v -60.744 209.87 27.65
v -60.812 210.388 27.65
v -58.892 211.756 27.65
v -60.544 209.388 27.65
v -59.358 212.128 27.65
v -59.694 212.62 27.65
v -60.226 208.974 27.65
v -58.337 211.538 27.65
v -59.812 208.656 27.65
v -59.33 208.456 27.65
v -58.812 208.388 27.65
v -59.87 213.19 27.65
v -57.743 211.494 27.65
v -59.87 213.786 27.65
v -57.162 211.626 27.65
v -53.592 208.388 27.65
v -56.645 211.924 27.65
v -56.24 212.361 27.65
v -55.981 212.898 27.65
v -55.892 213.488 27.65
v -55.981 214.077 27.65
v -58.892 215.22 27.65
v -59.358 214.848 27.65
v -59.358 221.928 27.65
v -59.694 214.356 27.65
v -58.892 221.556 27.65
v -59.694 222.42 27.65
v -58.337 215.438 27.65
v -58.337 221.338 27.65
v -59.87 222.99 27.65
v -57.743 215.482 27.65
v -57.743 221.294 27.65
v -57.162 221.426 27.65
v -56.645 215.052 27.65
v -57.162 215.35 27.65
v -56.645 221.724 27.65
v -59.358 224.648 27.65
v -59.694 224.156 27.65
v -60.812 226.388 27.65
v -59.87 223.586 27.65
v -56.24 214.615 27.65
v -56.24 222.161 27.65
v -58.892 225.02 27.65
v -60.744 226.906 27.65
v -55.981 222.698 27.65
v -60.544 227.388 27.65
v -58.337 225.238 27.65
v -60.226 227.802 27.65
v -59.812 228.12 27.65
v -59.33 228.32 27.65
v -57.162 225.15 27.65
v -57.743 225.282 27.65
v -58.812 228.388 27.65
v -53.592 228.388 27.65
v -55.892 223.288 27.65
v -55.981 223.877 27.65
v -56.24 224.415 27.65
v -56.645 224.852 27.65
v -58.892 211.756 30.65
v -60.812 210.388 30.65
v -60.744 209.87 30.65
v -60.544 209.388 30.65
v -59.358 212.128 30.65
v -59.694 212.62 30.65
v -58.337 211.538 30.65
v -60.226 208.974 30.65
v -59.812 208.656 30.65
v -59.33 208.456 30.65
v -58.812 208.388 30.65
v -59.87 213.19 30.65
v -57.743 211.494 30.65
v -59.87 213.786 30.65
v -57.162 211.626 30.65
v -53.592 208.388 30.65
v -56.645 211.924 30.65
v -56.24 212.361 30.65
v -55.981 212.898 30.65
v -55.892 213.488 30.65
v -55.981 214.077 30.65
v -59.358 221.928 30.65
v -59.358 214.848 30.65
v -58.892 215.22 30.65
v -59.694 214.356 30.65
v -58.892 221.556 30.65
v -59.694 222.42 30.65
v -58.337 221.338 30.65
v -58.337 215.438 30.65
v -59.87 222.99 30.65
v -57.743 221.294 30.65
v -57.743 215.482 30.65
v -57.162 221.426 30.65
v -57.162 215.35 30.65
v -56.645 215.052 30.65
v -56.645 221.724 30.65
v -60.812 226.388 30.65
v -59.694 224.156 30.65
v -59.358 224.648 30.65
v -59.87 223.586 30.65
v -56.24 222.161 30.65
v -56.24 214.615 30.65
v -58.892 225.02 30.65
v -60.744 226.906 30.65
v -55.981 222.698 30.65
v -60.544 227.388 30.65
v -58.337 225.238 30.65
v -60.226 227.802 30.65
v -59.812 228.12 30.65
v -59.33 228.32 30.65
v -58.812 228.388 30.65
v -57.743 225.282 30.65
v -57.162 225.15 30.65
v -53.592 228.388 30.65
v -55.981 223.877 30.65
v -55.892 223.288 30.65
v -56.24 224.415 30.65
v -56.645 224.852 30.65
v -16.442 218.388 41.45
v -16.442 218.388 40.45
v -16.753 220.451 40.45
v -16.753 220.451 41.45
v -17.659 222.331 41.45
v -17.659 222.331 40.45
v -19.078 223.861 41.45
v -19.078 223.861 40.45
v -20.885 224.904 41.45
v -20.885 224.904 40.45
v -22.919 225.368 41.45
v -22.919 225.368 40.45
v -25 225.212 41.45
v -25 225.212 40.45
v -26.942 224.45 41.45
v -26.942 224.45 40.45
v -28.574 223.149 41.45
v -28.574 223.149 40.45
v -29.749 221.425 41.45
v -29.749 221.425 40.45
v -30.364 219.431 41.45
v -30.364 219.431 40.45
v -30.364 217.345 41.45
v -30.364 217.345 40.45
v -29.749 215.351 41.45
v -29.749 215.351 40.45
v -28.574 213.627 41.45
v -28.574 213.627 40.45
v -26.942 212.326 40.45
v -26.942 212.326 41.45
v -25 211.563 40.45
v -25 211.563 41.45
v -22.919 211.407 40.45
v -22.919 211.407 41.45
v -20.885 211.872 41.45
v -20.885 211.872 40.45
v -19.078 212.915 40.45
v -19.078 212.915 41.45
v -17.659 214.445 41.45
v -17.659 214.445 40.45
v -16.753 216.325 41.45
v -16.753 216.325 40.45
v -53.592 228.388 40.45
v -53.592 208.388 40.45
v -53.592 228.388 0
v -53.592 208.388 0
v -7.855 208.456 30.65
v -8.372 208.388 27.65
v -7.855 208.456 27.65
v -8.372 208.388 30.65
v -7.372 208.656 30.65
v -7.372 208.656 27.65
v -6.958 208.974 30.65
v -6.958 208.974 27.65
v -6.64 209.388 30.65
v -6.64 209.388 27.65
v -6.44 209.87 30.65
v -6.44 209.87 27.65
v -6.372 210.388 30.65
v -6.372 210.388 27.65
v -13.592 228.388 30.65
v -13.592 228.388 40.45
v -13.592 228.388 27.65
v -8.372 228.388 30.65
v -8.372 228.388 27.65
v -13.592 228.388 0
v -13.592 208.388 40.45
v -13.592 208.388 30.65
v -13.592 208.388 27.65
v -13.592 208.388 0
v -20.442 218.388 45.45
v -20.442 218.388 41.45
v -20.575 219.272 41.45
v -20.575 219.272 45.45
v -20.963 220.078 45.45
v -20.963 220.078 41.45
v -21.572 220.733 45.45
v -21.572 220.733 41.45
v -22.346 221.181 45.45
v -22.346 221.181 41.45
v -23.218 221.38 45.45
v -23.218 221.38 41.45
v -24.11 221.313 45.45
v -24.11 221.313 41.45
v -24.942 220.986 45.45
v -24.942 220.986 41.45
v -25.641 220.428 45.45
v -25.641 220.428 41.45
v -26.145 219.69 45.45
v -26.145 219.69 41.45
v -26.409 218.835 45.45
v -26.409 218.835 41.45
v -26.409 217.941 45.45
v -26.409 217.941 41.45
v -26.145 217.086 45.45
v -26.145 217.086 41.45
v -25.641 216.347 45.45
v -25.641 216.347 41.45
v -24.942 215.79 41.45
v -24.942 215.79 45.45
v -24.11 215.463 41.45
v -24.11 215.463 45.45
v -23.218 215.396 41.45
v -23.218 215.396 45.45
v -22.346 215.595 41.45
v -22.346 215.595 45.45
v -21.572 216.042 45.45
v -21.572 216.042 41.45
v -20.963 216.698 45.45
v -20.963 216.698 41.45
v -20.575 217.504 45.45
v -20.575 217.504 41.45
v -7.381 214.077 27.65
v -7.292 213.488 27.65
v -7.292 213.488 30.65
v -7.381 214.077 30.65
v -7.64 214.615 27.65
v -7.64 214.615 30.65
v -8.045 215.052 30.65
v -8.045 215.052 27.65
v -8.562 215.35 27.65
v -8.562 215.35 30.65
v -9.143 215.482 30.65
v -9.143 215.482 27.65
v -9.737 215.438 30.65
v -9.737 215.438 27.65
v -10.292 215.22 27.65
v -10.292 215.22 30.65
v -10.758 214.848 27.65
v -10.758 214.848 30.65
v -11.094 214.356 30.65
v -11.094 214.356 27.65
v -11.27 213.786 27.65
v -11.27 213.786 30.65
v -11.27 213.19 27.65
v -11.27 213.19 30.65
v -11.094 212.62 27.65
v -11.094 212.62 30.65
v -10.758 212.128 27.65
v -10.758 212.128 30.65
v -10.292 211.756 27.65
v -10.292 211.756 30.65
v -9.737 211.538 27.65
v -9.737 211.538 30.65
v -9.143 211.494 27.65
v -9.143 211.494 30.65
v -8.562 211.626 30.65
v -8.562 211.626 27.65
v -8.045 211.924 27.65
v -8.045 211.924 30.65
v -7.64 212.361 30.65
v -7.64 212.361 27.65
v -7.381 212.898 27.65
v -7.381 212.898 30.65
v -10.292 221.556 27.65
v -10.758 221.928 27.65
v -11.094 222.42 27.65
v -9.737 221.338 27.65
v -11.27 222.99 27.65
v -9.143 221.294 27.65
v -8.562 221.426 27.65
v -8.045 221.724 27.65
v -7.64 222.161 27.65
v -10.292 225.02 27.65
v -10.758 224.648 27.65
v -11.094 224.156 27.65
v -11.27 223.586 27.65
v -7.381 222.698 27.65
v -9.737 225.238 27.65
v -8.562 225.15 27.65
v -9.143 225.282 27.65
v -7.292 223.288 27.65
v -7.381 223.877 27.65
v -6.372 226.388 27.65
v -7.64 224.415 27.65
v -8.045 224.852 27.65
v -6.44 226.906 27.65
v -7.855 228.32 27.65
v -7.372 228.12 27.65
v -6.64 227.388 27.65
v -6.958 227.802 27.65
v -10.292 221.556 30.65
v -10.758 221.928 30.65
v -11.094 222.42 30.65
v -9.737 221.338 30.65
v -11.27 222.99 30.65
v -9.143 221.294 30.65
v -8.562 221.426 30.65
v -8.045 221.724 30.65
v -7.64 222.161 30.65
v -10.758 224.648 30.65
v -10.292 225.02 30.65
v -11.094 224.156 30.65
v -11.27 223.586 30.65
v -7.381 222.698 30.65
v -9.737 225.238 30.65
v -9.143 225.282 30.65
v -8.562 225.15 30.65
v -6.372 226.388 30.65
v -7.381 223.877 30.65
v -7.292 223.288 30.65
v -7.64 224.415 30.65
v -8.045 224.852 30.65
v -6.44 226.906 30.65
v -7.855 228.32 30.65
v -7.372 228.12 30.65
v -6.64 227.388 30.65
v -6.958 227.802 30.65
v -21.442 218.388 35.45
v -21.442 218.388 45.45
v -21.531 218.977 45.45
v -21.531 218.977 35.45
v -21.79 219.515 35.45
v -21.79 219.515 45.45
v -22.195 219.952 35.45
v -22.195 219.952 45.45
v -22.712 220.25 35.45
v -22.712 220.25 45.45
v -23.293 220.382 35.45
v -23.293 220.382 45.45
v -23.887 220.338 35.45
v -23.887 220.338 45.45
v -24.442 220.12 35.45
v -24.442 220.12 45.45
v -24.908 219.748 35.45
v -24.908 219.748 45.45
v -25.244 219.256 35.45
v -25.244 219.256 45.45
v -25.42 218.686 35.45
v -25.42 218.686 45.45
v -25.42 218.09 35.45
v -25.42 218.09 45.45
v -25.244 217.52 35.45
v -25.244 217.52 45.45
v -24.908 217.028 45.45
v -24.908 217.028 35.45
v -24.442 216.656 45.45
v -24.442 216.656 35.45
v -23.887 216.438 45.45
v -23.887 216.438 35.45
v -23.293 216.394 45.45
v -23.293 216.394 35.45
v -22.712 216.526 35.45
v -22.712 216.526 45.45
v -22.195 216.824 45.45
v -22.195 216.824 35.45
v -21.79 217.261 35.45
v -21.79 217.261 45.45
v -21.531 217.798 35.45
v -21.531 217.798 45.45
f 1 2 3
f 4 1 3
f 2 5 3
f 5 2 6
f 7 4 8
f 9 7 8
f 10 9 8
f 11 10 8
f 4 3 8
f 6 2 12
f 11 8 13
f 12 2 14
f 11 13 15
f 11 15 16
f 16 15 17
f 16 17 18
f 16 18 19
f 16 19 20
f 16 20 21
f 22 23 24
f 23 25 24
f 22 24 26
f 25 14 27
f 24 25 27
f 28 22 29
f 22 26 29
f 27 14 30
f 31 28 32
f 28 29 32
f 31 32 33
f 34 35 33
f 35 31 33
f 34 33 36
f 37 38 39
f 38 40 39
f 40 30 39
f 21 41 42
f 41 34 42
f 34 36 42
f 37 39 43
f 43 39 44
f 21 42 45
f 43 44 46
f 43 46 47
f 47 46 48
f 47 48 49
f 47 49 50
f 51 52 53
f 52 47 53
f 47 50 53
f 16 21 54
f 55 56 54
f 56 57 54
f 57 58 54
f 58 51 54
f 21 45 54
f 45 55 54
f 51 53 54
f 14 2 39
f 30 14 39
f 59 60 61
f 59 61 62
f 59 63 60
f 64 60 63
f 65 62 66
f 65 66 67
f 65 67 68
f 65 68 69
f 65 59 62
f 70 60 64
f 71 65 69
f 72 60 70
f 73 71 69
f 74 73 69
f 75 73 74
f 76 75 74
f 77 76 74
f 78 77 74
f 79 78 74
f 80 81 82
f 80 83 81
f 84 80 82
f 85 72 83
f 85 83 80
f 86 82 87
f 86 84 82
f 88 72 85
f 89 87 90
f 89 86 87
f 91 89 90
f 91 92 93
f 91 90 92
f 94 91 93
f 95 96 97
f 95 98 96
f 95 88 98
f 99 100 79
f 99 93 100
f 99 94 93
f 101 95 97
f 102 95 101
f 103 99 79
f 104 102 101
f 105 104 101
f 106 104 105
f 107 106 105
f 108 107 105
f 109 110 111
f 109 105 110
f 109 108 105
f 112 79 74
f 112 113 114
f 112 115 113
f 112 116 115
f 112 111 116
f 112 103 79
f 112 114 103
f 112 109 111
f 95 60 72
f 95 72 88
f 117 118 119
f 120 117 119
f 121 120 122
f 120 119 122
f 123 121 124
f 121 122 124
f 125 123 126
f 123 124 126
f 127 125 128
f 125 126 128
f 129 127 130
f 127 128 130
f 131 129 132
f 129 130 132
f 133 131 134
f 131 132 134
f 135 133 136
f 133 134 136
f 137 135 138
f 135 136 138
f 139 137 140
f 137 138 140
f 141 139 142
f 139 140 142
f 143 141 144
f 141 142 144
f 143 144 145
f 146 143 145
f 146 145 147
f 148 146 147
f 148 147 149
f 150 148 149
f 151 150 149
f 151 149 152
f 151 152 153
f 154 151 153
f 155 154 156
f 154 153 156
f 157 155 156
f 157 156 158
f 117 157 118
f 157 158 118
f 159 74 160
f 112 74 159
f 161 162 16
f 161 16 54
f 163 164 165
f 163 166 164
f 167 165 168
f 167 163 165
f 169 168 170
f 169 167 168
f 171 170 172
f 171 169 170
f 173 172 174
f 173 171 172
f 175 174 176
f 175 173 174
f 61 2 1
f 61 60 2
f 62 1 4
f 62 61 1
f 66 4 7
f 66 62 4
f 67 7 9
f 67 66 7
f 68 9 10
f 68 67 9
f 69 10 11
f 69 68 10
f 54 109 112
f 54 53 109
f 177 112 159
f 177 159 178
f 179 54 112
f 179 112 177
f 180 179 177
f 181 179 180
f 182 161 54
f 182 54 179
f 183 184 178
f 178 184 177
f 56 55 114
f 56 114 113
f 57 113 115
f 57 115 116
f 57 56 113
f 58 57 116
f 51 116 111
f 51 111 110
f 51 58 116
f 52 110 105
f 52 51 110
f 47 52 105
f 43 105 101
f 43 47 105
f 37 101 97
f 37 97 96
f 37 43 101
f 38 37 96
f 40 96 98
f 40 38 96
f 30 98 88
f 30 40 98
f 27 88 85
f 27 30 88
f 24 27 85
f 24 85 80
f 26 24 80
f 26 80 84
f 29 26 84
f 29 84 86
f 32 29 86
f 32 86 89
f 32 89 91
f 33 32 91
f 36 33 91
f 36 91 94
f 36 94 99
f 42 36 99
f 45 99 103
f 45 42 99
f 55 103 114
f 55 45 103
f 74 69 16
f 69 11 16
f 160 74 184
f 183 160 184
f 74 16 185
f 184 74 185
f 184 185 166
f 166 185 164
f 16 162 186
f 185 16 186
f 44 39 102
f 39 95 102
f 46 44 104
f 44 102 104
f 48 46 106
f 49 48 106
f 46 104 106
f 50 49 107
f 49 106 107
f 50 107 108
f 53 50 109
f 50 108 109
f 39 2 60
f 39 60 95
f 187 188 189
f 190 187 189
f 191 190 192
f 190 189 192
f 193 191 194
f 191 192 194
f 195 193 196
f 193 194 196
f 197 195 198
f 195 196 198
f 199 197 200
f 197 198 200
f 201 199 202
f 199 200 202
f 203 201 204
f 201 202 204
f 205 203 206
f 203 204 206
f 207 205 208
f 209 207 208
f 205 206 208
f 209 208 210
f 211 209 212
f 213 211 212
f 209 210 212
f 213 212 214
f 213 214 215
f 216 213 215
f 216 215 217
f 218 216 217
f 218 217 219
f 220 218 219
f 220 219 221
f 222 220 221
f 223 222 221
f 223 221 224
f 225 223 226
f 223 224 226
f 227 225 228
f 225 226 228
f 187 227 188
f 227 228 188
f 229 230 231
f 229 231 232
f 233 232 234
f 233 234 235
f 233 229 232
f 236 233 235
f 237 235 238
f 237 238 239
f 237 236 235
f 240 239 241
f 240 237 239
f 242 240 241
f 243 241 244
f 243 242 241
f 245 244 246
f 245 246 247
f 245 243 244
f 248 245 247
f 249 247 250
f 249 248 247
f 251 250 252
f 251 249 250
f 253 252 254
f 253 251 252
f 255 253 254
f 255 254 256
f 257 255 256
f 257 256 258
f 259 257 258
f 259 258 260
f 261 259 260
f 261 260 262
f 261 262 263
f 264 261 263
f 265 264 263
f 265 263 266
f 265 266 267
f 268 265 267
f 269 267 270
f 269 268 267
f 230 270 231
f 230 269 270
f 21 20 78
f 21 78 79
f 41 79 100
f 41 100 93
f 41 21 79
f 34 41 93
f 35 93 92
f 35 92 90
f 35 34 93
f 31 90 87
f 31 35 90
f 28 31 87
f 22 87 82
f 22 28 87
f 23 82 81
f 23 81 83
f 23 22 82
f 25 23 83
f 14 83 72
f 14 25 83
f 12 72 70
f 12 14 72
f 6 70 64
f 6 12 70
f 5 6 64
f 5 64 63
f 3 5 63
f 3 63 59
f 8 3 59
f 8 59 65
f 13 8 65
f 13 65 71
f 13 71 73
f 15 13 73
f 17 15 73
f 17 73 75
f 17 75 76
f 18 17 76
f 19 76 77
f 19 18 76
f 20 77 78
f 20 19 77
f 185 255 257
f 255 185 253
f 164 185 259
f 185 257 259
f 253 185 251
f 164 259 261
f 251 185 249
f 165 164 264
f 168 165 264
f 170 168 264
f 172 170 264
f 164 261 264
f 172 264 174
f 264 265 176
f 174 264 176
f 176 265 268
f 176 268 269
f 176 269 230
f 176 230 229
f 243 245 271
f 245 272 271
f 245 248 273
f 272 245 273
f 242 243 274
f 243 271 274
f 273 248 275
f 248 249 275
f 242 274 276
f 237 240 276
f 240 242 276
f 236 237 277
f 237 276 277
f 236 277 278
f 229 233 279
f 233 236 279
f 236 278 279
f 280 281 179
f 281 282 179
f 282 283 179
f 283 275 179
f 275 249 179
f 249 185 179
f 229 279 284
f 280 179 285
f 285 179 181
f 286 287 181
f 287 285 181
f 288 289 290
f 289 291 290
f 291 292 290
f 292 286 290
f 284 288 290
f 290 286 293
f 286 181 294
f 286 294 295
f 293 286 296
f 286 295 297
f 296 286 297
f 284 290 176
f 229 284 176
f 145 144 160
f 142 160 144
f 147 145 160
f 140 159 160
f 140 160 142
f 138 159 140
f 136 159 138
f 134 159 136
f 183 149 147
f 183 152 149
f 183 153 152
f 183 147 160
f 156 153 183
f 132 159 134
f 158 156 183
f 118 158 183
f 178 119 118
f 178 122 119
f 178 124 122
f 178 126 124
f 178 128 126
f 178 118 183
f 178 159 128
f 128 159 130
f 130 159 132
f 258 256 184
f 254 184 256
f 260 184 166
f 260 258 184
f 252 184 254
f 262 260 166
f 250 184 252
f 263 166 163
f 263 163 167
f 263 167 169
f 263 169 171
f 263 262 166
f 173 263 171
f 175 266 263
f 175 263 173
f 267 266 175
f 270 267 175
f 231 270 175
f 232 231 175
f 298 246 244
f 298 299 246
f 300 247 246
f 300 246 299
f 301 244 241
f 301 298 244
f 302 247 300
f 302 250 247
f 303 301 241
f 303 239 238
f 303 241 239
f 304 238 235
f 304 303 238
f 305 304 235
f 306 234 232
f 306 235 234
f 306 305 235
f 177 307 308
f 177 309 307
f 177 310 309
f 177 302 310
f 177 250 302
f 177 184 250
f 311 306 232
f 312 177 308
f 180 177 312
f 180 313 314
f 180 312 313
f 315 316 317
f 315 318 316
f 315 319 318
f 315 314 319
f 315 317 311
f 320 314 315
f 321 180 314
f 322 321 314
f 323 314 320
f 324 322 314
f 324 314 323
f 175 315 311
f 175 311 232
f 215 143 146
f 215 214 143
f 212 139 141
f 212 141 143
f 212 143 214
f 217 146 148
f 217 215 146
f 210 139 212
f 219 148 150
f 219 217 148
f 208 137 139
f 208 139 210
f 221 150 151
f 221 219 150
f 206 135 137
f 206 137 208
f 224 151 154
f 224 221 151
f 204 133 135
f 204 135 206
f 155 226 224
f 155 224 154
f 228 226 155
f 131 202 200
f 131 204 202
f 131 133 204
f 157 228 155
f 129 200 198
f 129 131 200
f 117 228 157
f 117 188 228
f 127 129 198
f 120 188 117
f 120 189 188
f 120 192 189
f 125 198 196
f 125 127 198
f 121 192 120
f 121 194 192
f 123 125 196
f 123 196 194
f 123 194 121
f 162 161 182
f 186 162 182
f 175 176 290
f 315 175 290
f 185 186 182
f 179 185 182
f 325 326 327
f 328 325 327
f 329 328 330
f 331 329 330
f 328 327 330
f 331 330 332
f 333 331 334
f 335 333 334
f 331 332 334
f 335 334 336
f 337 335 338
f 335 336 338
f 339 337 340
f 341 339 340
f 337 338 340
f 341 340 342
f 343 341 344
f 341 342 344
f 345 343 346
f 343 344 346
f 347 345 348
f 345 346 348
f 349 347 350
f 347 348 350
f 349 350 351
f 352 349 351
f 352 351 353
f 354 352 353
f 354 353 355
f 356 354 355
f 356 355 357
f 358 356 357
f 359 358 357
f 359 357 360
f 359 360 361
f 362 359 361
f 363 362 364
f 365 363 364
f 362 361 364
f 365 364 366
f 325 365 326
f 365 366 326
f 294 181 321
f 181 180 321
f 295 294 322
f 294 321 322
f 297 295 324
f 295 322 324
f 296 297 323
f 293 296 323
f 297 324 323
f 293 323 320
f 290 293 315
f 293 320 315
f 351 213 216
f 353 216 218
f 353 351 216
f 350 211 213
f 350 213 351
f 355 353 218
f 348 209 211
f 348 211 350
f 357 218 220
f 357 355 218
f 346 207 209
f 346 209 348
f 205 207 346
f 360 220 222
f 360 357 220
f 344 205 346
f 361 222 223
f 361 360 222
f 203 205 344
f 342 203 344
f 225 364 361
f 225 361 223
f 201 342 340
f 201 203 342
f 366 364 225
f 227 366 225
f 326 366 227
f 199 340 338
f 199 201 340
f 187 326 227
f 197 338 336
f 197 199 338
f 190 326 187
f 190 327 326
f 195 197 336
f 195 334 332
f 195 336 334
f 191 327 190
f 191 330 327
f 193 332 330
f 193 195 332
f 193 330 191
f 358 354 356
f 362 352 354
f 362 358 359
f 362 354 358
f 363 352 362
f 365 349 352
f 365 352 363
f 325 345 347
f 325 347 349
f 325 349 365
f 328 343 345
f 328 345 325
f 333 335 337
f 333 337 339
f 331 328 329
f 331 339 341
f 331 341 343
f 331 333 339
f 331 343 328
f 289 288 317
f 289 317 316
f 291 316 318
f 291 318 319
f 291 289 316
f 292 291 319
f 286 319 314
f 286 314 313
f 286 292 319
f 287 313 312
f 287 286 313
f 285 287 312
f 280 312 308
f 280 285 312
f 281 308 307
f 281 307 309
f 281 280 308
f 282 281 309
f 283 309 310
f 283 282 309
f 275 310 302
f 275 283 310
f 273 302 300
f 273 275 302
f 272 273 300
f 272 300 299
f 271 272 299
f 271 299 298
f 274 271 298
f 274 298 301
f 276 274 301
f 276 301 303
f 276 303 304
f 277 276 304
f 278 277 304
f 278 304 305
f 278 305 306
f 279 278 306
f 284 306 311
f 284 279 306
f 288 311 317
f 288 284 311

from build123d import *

# Parameters (mm, degrees)
SKETCH2_W           = 40
SKETCH2_H           = 20
BOSS_EXTRUDE1_DEPTH = 27.65
SKETCH3_W           = 54.44
SKETCH3_H           = 20
SKETCH3_R           = 2
BOSS_EXTRUDE2_DEPTH = 3
SKETCH4_W           = 40
SKETCH4_H           = 20
BOSS_EXTRUDE3_DEPTH = 9.8
SKETCH5_R           = 7
BOSS_EXTRUDE4_DEPTH = 1
SKETCH6_R           = 3
BOSS_EXTRUDE5_DEPTH = 4
FILLET1_R           = 2
SKETCH7_R           = 2
CUT_EXTRUDE1_DEPTH  = 10


with BuildPart() as part:
    # Sketch2 → Boss-Extrude1 (new body)
    with BuildSketch(Plane.XY):
        with Locations((-33.592215537, 218.387921433)):
            Rectangle(SKETCH2_W, SKETCH2_H)
    extrude(amount=BOSS_EXTRUDE1_DEPTH)

    # Sketch3 → Boss-Extrude2 (add)
    with BuildSketch(Plane.XY.offset(27.65)):
        with Locations((-33.592215537, 218.387921433)):
            Rectangle(SKETCH3_W, SKETCH3_H)
        with Locations((-9.292215537, 213.487921433)):
            Circle(SKETCH3_R, mode=Mode.SUBTRACT)
        with Locations((-9.292215537, 223.287921433)):
            Circle(SKETCH3_R, mode=Mode.SUBTRACT)
        with Locations((-57.892215537, 223.287921433)):
            Circle(SKETCH3_R, mode=Mode.SUBTRACT)
        with Locations((-57.892215537, 213.487921433)):
            Circle(SKETCH3_R, mode=Mode.SUBTRACT)
    extrude(amount=BOSS_EXTRUDE2_DEPTH)

    # Sketch4 → Boss-Extrude3 (add)
    with BuildSketch(Plane.XY.offset(30.65)):
        with Locations((-33.592215537, 218.387921433)):
            Rectangle(SKETCH4_W, SKETCH4_H)
    extrude(amount=BOSS_EXTRUDE3_DEPTH)

    # Sketch5 → Boss-Extrude4 (add)
    with BuildSketch(Plane.XY.offset(40.45)):
        with Locations((-23.442215537, 218.387921433)):
            Circle(SKETCH5_R)
    extrude(amount=BOSS_EXTRUDE4_DEPTH)

    # Sketch6 → Boss-Extrude5 (add)
    with BuildSketch(Plane.XY.offset(41.45)):
        with Locations((-23.442215537, 218.387921433)):
            Circle(SKETCH6_R)
    extrude(amount=BOSS_EXTRUDE5_DEPTH)

    # Fillet1
    fillet1_edges = [part.edges().sort_by_distance(p)[0] for p in [
        (-6.372215537, 208.387921433, 29.15),
        (-60.812215537, 208.387921433, 29.15),
        (-6.372215537, 228.387921433, 29.15),
        (-60.812215537, 228.387921433, 29.15),
    ]]
    fillet(fillet1_edges, radius=FILLET1_R)

    # Sketch7 → Cut-Extrude1 (cut)
    with BuildSketch(Plane.XY.offset(45.45)):
        with Locations((-23.442215537, 218.387921433)):
            Circle(SKETCH7_R)
    extrude(amount=-CUT_EXTRUDE1_DEPTH, mode=Mode.SUBTRACT)


solid = part.part
